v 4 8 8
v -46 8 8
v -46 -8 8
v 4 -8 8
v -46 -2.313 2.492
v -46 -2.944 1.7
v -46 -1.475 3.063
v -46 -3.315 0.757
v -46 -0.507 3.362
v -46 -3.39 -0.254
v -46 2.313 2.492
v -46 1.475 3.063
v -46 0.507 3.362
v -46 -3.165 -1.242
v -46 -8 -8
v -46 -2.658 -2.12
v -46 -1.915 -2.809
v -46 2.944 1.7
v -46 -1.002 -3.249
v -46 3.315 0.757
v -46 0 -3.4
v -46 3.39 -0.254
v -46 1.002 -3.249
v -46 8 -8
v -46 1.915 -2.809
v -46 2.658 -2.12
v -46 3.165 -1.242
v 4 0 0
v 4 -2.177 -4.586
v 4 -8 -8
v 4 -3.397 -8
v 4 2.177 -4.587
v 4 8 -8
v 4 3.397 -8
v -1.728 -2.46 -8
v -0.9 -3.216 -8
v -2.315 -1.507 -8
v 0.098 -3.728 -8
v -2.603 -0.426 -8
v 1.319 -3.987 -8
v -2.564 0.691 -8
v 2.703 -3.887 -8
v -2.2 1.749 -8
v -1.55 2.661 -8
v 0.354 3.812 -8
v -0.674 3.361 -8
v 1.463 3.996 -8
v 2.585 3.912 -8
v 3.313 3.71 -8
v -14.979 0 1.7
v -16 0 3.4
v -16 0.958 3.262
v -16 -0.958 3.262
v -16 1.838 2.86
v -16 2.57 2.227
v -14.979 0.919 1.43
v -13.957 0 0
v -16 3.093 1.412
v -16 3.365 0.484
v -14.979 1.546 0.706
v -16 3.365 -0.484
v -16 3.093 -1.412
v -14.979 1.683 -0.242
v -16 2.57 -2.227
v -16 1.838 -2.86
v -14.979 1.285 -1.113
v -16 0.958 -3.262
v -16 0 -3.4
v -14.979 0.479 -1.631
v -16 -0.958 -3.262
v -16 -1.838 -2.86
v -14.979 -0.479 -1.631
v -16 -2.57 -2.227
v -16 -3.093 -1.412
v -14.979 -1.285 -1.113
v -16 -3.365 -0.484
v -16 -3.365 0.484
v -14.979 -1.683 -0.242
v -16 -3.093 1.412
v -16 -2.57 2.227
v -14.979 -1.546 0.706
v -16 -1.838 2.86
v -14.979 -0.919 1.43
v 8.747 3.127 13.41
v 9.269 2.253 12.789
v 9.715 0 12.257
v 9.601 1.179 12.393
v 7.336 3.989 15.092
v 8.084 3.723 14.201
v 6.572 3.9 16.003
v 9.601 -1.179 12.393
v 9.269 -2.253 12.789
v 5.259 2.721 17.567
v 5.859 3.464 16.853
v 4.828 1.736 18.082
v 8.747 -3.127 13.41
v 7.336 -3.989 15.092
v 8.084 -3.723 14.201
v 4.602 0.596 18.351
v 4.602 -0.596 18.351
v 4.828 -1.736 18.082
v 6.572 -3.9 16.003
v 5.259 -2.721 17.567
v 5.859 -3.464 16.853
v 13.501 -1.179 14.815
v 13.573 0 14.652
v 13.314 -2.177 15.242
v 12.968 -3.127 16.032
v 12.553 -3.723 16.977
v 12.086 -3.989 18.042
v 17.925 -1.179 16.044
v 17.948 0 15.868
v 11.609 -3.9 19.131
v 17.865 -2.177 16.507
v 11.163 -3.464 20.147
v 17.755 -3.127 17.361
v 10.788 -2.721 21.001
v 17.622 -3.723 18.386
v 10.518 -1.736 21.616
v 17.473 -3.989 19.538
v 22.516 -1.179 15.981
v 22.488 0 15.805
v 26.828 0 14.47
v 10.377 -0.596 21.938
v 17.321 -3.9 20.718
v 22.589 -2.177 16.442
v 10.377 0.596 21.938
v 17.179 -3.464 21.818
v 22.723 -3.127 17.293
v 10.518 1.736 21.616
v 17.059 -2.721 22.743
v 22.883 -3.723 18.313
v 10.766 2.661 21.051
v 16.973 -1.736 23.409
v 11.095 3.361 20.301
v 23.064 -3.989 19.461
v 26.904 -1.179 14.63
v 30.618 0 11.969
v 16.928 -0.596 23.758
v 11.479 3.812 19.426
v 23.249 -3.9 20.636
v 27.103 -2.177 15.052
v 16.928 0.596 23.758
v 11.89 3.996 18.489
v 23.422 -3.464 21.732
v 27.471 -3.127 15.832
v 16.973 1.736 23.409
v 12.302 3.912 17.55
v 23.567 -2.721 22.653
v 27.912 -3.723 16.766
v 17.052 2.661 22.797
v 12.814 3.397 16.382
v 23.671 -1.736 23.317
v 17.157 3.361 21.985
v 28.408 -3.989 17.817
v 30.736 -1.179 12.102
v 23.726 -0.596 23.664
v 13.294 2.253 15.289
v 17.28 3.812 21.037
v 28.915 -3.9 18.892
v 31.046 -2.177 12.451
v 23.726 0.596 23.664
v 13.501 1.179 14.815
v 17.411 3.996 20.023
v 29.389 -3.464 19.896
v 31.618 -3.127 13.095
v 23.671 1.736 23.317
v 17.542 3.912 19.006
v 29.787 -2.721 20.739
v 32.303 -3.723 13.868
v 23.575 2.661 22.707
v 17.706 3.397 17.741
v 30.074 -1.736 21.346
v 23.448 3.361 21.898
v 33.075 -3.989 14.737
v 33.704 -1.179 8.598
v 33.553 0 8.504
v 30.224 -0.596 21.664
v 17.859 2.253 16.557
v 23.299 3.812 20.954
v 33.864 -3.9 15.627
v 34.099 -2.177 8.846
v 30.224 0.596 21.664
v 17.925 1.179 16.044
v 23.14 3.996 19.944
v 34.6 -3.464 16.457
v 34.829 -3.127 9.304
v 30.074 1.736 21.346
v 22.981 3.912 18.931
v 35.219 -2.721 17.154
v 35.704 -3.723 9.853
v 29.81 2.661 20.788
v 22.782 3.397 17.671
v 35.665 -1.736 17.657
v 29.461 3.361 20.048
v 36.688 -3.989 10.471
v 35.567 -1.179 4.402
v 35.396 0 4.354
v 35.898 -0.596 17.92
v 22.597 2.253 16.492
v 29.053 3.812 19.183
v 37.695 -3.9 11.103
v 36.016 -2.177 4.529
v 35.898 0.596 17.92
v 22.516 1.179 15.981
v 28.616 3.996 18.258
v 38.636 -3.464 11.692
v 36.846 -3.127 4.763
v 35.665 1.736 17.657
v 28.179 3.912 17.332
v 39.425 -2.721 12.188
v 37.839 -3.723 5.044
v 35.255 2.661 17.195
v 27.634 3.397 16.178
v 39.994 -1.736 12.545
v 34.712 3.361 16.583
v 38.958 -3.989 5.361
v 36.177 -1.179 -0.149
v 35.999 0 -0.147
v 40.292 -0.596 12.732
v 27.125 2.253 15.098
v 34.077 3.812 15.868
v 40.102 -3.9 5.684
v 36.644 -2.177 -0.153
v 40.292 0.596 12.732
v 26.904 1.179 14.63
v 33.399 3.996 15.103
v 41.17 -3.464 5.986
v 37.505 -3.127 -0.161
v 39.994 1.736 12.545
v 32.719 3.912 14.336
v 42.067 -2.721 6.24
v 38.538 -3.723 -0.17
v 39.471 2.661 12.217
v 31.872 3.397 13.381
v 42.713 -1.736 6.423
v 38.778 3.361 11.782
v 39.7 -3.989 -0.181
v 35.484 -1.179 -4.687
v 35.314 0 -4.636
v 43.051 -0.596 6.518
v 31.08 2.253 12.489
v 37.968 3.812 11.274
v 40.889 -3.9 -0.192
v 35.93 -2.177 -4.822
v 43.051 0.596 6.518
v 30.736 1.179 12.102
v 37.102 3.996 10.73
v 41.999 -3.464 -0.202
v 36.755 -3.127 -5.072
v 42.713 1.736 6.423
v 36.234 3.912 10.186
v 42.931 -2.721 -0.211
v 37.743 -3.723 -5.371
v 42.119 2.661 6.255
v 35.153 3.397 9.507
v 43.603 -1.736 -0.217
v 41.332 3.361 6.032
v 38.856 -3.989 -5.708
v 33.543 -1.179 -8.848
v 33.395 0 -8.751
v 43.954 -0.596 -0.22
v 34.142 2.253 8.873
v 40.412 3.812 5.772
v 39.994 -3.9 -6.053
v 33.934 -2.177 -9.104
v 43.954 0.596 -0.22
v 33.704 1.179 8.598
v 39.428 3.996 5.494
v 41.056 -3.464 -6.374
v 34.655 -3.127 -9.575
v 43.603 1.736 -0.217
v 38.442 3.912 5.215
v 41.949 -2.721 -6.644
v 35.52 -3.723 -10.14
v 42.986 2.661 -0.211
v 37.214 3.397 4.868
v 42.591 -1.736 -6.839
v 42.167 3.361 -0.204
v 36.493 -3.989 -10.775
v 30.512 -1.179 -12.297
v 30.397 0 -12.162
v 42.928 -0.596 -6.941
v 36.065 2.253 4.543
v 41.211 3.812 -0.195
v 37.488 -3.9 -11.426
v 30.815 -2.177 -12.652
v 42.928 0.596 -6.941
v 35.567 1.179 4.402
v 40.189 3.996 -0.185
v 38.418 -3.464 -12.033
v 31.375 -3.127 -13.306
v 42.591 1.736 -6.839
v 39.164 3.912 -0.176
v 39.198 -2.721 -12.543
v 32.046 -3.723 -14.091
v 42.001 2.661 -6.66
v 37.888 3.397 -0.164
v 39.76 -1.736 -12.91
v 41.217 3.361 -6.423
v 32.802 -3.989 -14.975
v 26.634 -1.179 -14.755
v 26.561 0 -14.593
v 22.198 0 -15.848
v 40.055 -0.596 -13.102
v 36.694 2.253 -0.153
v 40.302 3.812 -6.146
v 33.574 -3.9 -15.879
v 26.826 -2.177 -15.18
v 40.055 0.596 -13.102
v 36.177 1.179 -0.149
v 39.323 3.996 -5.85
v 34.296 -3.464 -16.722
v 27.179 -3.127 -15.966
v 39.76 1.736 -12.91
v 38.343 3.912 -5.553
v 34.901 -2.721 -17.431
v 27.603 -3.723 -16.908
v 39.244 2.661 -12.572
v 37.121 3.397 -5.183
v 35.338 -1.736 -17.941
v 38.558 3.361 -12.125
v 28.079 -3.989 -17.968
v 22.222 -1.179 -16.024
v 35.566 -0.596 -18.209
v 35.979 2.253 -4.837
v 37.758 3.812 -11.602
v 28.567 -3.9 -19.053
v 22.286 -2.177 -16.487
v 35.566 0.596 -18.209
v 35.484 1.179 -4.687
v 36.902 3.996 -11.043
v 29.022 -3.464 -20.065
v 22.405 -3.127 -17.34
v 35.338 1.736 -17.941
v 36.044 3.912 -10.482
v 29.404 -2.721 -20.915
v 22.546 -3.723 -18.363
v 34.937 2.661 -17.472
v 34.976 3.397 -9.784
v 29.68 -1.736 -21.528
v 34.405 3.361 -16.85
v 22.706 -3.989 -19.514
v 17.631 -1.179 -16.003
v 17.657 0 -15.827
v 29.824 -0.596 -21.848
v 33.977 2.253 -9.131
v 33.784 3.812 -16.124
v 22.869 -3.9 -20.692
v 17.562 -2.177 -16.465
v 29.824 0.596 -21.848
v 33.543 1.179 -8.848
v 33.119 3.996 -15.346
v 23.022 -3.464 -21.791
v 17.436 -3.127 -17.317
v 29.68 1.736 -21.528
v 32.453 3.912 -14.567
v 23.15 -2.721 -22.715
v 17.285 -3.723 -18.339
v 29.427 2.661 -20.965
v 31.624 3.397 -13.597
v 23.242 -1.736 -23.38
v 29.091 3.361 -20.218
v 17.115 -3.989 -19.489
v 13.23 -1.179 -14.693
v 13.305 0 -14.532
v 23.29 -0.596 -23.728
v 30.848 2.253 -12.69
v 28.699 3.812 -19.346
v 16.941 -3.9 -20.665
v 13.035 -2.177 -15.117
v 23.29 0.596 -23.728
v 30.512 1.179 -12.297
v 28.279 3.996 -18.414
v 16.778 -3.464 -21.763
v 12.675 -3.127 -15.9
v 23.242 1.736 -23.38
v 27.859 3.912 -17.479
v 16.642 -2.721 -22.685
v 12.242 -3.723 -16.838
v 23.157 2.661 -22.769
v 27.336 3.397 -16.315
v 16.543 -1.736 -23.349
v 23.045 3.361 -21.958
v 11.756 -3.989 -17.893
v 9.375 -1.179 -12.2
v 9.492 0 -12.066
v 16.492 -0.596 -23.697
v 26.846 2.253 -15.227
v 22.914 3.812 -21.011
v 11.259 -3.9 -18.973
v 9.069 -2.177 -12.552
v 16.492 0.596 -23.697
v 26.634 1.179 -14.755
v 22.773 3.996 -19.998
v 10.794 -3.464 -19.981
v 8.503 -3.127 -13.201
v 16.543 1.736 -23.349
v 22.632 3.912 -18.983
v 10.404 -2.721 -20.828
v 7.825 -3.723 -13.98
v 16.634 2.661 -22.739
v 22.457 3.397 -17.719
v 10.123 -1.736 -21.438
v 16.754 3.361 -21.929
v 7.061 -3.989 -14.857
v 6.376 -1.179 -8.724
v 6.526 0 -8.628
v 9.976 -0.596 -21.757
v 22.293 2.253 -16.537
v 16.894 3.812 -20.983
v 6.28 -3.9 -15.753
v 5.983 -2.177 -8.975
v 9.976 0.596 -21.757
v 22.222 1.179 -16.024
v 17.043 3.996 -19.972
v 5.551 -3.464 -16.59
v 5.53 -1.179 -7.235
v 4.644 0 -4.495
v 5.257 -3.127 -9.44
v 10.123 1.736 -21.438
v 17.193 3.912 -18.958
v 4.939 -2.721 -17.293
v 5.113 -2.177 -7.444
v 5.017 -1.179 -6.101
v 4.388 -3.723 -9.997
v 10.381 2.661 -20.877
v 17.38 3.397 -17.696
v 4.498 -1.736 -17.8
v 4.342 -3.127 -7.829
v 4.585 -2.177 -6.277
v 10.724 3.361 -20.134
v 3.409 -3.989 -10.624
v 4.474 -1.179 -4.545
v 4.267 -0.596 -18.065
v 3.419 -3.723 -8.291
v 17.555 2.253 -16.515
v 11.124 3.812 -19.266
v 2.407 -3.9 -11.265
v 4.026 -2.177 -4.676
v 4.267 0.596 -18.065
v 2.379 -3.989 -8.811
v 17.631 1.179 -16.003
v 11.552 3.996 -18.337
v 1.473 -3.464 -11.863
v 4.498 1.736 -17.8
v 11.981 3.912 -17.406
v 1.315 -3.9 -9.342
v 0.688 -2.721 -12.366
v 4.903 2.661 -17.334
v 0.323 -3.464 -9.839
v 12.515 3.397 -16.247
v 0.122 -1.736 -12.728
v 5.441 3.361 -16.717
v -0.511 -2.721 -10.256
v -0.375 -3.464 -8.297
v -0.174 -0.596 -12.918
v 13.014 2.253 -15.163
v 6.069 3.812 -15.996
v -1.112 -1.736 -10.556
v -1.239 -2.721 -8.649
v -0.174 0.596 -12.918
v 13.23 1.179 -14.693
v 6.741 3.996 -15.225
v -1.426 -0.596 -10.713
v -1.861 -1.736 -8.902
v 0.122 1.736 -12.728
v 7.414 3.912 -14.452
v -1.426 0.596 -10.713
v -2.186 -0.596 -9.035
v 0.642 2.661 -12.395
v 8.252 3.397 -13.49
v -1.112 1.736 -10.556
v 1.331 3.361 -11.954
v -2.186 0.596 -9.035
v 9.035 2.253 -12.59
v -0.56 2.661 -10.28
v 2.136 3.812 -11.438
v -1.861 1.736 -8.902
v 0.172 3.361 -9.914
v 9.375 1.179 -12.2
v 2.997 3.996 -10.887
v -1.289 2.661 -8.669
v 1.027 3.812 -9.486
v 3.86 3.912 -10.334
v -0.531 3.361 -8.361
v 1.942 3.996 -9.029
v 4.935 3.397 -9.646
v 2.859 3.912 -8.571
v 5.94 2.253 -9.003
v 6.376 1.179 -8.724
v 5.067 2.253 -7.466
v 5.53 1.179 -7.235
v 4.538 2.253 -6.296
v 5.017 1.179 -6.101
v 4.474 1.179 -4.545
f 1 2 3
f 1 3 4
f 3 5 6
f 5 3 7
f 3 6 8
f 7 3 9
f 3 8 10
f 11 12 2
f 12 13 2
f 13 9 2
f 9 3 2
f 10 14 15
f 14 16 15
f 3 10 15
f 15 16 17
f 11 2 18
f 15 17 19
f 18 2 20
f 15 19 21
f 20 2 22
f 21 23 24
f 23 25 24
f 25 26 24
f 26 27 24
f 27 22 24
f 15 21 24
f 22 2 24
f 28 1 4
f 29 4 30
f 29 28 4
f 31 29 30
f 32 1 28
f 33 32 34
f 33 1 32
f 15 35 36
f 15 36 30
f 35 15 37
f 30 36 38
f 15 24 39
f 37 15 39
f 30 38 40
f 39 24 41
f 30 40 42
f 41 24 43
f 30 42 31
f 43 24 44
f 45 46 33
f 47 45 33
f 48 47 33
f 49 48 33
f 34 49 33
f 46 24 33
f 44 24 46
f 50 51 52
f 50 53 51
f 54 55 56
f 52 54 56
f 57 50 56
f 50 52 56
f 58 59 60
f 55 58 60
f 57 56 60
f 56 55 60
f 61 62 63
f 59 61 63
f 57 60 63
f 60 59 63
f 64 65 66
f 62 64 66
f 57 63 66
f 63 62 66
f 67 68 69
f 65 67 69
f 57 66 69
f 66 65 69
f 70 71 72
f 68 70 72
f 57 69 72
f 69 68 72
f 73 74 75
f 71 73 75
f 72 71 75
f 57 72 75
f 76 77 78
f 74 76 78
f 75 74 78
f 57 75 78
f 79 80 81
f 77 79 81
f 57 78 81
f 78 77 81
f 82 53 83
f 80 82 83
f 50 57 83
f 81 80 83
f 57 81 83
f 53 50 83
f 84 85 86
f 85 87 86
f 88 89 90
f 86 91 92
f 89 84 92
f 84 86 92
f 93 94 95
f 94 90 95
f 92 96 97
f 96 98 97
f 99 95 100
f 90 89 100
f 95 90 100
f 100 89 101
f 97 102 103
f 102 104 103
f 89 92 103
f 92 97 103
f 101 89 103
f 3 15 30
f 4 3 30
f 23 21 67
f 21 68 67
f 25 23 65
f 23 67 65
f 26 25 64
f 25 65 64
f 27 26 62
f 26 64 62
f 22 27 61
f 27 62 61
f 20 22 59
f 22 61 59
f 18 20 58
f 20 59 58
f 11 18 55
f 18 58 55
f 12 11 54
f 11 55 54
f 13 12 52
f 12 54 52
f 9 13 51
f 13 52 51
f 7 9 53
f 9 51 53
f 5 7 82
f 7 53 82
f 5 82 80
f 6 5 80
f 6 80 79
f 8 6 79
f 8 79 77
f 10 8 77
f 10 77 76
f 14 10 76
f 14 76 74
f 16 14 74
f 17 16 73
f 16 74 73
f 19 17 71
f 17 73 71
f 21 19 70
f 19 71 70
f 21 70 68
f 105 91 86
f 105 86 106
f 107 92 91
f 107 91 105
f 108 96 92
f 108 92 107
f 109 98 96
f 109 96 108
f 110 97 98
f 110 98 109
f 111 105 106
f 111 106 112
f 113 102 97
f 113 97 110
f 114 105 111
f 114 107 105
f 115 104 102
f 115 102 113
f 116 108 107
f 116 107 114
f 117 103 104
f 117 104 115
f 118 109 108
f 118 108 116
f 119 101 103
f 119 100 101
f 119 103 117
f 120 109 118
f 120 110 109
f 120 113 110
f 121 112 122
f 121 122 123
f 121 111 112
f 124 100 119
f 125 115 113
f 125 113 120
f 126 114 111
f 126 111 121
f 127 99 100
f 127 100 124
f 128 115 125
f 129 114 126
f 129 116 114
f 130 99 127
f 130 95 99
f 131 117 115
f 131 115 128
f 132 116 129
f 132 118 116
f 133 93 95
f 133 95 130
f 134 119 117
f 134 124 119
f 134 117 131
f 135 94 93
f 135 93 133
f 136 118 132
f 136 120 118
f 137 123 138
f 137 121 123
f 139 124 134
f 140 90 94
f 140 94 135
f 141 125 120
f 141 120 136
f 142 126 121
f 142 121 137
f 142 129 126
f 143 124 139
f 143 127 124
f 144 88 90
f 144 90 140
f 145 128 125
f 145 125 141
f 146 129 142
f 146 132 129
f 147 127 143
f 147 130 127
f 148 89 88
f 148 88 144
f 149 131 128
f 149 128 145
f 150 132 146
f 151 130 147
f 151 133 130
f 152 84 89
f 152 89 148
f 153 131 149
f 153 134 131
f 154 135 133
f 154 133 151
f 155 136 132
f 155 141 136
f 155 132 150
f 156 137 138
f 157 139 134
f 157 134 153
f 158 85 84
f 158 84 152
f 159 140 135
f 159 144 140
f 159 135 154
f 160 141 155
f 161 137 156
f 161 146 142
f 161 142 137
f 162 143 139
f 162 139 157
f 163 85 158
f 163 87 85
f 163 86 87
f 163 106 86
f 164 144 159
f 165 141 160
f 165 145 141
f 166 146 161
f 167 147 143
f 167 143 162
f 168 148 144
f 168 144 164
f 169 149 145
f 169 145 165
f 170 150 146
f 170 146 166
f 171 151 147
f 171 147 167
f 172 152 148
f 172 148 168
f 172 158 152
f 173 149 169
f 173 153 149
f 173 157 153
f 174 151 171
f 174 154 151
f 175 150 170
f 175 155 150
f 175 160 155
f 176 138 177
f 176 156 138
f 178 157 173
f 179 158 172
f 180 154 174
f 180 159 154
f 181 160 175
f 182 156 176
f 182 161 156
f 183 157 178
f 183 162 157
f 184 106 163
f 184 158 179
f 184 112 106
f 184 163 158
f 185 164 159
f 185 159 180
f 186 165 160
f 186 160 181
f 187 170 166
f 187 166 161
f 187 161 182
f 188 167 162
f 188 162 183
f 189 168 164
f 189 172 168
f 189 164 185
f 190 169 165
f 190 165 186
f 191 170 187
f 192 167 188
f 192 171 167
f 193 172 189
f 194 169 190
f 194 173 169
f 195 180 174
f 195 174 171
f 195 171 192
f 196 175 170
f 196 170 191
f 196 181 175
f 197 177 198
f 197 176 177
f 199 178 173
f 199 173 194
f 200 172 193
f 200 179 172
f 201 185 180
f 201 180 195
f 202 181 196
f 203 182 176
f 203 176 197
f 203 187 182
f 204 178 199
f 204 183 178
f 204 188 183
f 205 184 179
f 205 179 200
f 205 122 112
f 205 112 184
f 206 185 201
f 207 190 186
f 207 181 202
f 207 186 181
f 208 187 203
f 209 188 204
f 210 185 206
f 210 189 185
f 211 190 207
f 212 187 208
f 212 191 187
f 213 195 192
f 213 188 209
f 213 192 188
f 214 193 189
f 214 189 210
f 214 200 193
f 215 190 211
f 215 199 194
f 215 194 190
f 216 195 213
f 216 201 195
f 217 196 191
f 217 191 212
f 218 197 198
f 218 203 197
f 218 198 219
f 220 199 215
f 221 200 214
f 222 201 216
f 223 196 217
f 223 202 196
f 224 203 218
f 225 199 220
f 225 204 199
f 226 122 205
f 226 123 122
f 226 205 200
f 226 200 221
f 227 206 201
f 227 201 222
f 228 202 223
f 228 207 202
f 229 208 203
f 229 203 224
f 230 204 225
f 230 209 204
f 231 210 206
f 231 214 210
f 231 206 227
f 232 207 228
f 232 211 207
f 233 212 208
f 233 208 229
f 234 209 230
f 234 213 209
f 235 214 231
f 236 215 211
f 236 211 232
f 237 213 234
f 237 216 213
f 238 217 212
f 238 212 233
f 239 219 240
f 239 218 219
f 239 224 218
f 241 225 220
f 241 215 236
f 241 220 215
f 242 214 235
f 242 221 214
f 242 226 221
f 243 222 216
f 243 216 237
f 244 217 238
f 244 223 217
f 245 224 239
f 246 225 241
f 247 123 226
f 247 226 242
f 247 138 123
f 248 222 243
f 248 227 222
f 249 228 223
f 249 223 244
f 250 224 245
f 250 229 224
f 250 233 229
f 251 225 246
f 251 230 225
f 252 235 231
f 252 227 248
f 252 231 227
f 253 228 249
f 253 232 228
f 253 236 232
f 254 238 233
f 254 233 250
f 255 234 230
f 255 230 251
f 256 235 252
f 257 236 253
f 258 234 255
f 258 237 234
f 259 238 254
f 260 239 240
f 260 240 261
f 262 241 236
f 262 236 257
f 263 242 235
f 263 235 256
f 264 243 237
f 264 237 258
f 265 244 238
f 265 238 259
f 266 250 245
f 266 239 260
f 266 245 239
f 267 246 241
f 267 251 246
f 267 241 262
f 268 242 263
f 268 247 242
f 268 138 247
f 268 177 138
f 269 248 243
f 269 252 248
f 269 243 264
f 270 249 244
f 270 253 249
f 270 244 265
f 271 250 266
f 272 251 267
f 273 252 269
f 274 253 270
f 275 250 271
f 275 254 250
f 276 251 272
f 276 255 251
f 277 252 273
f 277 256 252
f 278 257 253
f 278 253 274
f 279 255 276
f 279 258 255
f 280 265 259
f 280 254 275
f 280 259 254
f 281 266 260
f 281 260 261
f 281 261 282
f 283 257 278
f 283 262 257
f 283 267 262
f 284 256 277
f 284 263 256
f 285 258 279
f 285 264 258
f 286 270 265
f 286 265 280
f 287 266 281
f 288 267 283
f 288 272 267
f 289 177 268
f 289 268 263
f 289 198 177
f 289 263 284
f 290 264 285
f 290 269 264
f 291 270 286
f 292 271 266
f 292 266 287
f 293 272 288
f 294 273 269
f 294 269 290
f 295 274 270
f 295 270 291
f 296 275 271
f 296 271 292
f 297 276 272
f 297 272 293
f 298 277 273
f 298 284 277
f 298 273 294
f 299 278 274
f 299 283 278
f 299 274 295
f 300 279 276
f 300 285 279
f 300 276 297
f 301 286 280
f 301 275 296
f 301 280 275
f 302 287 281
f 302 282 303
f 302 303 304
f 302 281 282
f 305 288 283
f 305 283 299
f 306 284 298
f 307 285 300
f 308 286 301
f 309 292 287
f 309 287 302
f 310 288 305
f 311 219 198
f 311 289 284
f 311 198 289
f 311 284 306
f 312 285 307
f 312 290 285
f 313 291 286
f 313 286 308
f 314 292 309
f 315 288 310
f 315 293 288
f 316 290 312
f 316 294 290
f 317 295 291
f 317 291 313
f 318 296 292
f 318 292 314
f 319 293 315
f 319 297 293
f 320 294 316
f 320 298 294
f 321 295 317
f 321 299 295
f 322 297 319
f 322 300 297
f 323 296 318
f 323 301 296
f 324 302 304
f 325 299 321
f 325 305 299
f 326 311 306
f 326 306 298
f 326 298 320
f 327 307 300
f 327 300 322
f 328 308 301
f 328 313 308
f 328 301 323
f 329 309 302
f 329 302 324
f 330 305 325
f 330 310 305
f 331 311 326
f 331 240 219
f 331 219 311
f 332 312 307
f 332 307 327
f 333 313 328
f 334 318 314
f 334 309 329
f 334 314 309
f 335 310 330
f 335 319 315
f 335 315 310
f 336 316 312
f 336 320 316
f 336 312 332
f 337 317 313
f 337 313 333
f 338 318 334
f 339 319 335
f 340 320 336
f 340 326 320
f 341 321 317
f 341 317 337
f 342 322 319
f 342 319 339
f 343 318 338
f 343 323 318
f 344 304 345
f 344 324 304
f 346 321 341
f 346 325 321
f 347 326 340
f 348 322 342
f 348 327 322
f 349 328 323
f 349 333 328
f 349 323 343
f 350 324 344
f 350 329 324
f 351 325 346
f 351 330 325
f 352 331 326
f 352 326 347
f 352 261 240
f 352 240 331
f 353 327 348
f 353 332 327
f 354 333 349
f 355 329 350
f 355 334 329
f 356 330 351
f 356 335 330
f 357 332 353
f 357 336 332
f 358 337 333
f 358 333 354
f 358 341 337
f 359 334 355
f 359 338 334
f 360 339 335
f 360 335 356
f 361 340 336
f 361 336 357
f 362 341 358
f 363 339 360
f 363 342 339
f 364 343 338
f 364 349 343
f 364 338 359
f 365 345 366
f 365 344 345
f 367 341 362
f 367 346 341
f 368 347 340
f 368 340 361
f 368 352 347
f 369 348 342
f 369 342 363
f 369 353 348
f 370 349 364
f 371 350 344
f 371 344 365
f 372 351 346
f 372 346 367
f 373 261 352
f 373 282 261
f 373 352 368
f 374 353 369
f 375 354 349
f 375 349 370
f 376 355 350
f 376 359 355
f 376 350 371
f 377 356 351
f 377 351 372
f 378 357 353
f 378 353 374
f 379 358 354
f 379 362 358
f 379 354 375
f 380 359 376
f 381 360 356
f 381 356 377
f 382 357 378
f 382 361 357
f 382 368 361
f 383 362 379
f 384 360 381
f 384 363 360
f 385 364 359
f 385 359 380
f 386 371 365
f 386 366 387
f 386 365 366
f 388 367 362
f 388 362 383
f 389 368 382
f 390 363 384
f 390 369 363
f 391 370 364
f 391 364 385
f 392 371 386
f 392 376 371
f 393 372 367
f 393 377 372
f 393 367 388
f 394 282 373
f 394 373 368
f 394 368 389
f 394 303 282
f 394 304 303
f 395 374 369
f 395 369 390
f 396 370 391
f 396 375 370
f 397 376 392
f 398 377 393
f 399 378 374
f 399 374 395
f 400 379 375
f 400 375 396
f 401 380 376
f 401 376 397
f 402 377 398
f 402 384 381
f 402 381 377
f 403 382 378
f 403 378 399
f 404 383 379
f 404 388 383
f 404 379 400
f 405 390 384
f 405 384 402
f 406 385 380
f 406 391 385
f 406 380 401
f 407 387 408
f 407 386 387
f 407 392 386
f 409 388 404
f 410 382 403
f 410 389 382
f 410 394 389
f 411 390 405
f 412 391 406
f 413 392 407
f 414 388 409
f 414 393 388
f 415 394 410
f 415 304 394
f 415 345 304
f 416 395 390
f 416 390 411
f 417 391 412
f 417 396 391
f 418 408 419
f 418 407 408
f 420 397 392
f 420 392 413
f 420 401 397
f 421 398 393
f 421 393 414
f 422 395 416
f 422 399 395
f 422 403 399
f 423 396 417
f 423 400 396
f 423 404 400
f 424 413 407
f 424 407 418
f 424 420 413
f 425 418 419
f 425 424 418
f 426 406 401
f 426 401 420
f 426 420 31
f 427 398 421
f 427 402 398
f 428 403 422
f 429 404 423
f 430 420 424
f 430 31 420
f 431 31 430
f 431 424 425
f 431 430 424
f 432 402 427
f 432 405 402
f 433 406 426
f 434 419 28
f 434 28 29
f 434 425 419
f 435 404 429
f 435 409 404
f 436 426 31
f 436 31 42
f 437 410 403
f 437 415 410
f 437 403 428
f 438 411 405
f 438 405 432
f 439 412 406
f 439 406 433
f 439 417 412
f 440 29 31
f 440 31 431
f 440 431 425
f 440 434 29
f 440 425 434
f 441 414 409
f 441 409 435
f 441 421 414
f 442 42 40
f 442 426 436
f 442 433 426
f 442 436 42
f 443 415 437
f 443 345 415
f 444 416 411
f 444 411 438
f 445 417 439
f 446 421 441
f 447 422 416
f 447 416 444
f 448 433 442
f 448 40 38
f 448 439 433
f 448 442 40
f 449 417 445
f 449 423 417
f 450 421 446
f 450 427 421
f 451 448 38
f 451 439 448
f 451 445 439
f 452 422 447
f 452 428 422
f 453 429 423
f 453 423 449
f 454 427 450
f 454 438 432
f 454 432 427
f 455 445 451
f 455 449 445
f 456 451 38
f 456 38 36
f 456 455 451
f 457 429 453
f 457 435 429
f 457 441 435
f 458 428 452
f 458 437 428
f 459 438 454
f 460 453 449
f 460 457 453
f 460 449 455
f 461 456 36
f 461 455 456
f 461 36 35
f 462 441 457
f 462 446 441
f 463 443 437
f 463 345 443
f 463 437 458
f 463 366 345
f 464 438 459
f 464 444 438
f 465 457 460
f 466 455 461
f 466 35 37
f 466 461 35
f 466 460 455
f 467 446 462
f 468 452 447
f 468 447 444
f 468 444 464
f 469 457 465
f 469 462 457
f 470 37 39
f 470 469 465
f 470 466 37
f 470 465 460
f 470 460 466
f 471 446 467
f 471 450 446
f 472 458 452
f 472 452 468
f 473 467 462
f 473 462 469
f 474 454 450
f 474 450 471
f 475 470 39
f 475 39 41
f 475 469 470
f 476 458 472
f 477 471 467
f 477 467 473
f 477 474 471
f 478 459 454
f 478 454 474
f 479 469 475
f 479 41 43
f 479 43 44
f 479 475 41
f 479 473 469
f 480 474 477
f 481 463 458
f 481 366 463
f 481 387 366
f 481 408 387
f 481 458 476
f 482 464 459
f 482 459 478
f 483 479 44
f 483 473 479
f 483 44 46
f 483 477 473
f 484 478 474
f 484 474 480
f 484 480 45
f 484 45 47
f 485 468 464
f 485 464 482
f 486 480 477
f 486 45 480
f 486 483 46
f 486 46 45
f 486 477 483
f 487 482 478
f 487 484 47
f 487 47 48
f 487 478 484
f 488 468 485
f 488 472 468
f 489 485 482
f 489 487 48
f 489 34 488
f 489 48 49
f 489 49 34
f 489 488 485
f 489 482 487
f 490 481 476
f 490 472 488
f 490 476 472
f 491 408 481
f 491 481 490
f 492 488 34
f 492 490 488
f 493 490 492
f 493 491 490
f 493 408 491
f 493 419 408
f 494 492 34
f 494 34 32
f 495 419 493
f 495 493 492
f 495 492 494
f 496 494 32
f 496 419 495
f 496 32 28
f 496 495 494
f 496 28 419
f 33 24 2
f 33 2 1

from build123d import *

# Parameters (mm, degrees)
SKETCH2_R             = 4
SKETCH3_W             = 50
SKETCH3_H             = 16
BOSS_EXTRUDE1_DEPTH   = 8
M8_TAPPED_HOLE1_D     = 6.8
M8_TAPPED_HOLE1_DEPTH = 30
M8_TAPPED_HOLE1_TIP   = 2.042926105


with BuildPart() as part:
    # Sweep1: sweep along a path in Sketch1
    with BuildLine(Plane(origin=(0, 0, 0), x_dir=(1, 0, 0), z_dir=(0, 1, 0))) as sweep1_path:
        ThreePointArc((7.144247806, -15.320888862), (38.126155741, 8.452365235), (0, 0))
    # Sketch2 → Sweep1 (sweep)
    with BuildSketch(Plane.XY):
        Circle(SKETCH2_R)
    sweep(path=sweep1_path.line)

    # Sketch3 → Boss-Extrude1 (add, symmetric)
    with BuildSketch(Plane(origin=(0, 0, 0), x_dir=(1, 0, 0), z_dir=(0, 1, 0))):
        with Locations((-21, 0)):
            Rectangle(SKETCH3_W, SKETCH3_H)
    extrude(amount=BOSS_EXTRUDE1_DEPTH, both=True)

    # M8 Tapped Hole1
    with Locations(Plane.ZY.offset(46)):
        with Locations((0, 0)):
            Hole(M8_TAPPED_HOLE1_D / 2, depth=M8_TAPPED_HOLE1_DEPTH)
            with Locations((0, 0, -(M8_TAPPED_HOLE1_DEPTH + M8_TAPPED_HOLE1_TIP / 2))):  # 118° drill point
                Cone(0, M8_TAPPED_HOLE1_D / 2, M8_TAPPED_HOLE1_TIP, mode=Mode.SUBTRACT)


solid = part.part
